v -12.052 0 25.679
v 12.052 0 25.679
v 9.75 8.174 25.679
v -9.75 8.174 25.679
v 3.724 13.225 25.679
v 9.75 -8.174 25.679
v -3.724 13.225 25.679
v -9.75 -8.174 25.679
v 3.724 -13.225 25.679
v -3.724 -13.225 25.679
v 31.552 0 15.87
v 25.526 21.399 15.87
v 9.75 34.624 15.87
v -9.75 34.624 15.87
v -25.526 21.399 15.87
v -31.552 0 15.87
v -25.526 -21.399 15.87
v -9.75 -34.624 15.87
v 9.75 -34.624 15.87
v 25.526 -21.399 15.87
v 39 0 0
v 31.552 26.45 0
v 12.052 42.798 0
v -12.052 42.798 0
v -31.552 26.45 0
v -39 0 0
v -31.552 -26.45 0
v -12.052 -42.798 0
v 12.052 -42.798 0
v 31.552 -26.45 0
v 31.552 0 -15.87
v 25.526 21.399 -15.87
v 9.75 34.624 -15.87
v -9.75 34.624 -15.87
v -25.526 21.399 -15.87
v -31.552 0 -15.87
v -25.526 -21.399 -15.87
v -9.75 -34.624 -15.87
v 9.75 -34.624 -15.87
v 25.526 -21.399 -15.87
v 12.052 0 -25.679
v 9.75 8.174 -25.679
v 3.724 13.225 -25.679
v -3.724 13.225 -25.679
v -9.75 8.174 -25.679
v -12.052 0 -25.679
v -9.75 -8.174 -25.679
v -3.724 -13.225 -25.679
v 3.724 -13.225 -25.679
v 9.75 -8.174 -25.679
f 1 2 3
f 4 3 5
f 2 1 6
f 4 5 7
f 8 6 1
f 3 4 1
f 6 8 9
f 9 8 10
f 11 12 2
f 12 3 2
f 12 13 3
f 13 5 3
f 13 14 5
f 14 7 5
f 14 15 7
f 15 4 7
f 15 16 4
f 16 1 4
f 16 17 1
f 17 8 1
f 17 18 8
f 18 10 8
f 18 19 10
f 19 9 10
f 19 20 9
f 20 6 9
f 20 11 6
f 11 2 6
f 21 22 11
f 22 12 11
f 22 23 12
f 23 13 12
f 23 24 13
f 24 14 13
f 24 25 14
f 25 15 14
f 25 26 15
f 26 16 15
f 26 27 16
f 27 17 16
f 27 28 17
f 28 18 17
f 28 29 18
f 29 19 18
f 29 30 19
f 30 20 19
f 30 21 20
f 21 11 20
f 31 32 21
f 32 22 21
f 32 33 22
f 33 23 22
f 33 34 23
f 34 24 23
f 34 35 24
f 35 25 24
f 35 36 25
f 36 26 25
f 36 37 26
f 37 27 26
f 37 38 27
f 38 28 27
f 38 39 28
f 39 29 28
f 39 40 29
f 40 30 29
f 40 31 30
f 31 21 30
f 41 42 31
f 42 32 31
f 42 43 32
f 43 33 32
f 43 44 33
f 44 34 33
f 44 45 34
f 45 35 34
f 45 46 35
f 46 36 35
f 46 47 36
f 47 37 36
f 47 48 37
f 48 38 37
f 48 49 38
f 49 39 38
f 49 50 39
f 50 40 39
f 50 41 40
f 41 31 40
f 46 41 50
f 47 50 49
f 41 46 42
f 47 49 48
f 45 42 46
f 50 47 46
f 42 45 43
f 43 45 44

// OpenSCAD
// Generated by SolidPython 1.0.1 on 2020-07-29 00:46:51


scale(v = [13, 15, 9]) {
	sphere(r = 3);
}
/***********************************************
*********      SolidPython code:      **********
************************************************
 
# import packages: SolidPython
from solid import *
from solid.utils import *
from itertools import chain, combinations, permutations


class Resize:

    def __init__(self, scad_file):
        self.scad_file = scad_file
        #self.scad_file = import_scad(scad_file)
        # cone/cylinder param:
        self.r1 = 0
        self.r2 = 0
        self.h = 0
        # rectangular prism param:
        self.w = 0
        self.l = 0
        # ellipse param:
        self.r = 0

    # import OpenScad code (file name corresponds to shape)


    # classify shape + parameters
    def assign(self, param1, param2, param3):
        if self.scad_file == 'cone.scad':
            self.r1 = param1
            self.r2 = param2
            self.h = param3
        elif self.scad_file == 'cylinder.scad':
            self.r1 = param1
            self.r2 = param2
            self.h = param3
        elif self.scad_file == 'rectangularPrism.scad':
            self.h = param1
            self.l = param2
            self.w = param3
        else:
            self.r = param1
            self.h = param2

    # resize parameters
    def iterate(self):
        x = range(3, 20, 2)
        i = 1
        if self.scad_file == 'cone.scad':
            tempList = list(permutations(x, 2))
            for temp in tempList:
                param1 = temp[0]
                param2 = temp[1]
                filepath = 'produced_scad_files/' + 'cone' + str(param1) + '_' + str(param2) + '_' + '.scad'
                scad_render_to_file(cylinder(h=param1, r1=param2, r2=0), filepath)

        elif self.scad_file == 'cylinder.scad':
            tempList = list(permutations(x, 3))
            for temp in tempList:
                param1 = temp[0]
                param2 = temp[1]
                filepath = 'produced_scad_files/' + 'cylinder' + str(param1) + '_' + str(param2) + '_' + '.scad'
                scad_render_to_file(cylinder(h=param1, r1=param2, r2=param2), filepath)

        elif self.scad_file == 'rectangularPrism.scad':
            tempList = list(permutations(x, 3))
            for temp in tempList:
                param1 = temp[0]
                param2 = temp[1]
                param3 = temp[2]
                filepath = 'produced_scad_files/' + 'rectangularPrism' + str(param1) + '_' + str(param2) + '_' + str(
                    param3) + '.scad'
                scad_render_to_file(cube(size=(param1, param2, param3)), filepath)

        elif self.scad_file == 'ellipse.scad':
            tempList = list(permutations(x, 4))
            for temp in tempList:
                param1 = temp[0]
                param2 = temp[1]
                param3 = temp[2]
                param4 = temp[3]
                filepath = 'produced_scad_files/' + 'ellipse' + str(param1) + '_' + str(param2) + '_' + str(param3) + '_' + str(param4) + '.scad'
                scad_render_to_file(scale([param1, param2, param3])(sphere(r=param4)), filepath)

    def render_to_scadfile(self):
        scad_render_to_file(scad, 'example.scad') 
 
************************************************/
